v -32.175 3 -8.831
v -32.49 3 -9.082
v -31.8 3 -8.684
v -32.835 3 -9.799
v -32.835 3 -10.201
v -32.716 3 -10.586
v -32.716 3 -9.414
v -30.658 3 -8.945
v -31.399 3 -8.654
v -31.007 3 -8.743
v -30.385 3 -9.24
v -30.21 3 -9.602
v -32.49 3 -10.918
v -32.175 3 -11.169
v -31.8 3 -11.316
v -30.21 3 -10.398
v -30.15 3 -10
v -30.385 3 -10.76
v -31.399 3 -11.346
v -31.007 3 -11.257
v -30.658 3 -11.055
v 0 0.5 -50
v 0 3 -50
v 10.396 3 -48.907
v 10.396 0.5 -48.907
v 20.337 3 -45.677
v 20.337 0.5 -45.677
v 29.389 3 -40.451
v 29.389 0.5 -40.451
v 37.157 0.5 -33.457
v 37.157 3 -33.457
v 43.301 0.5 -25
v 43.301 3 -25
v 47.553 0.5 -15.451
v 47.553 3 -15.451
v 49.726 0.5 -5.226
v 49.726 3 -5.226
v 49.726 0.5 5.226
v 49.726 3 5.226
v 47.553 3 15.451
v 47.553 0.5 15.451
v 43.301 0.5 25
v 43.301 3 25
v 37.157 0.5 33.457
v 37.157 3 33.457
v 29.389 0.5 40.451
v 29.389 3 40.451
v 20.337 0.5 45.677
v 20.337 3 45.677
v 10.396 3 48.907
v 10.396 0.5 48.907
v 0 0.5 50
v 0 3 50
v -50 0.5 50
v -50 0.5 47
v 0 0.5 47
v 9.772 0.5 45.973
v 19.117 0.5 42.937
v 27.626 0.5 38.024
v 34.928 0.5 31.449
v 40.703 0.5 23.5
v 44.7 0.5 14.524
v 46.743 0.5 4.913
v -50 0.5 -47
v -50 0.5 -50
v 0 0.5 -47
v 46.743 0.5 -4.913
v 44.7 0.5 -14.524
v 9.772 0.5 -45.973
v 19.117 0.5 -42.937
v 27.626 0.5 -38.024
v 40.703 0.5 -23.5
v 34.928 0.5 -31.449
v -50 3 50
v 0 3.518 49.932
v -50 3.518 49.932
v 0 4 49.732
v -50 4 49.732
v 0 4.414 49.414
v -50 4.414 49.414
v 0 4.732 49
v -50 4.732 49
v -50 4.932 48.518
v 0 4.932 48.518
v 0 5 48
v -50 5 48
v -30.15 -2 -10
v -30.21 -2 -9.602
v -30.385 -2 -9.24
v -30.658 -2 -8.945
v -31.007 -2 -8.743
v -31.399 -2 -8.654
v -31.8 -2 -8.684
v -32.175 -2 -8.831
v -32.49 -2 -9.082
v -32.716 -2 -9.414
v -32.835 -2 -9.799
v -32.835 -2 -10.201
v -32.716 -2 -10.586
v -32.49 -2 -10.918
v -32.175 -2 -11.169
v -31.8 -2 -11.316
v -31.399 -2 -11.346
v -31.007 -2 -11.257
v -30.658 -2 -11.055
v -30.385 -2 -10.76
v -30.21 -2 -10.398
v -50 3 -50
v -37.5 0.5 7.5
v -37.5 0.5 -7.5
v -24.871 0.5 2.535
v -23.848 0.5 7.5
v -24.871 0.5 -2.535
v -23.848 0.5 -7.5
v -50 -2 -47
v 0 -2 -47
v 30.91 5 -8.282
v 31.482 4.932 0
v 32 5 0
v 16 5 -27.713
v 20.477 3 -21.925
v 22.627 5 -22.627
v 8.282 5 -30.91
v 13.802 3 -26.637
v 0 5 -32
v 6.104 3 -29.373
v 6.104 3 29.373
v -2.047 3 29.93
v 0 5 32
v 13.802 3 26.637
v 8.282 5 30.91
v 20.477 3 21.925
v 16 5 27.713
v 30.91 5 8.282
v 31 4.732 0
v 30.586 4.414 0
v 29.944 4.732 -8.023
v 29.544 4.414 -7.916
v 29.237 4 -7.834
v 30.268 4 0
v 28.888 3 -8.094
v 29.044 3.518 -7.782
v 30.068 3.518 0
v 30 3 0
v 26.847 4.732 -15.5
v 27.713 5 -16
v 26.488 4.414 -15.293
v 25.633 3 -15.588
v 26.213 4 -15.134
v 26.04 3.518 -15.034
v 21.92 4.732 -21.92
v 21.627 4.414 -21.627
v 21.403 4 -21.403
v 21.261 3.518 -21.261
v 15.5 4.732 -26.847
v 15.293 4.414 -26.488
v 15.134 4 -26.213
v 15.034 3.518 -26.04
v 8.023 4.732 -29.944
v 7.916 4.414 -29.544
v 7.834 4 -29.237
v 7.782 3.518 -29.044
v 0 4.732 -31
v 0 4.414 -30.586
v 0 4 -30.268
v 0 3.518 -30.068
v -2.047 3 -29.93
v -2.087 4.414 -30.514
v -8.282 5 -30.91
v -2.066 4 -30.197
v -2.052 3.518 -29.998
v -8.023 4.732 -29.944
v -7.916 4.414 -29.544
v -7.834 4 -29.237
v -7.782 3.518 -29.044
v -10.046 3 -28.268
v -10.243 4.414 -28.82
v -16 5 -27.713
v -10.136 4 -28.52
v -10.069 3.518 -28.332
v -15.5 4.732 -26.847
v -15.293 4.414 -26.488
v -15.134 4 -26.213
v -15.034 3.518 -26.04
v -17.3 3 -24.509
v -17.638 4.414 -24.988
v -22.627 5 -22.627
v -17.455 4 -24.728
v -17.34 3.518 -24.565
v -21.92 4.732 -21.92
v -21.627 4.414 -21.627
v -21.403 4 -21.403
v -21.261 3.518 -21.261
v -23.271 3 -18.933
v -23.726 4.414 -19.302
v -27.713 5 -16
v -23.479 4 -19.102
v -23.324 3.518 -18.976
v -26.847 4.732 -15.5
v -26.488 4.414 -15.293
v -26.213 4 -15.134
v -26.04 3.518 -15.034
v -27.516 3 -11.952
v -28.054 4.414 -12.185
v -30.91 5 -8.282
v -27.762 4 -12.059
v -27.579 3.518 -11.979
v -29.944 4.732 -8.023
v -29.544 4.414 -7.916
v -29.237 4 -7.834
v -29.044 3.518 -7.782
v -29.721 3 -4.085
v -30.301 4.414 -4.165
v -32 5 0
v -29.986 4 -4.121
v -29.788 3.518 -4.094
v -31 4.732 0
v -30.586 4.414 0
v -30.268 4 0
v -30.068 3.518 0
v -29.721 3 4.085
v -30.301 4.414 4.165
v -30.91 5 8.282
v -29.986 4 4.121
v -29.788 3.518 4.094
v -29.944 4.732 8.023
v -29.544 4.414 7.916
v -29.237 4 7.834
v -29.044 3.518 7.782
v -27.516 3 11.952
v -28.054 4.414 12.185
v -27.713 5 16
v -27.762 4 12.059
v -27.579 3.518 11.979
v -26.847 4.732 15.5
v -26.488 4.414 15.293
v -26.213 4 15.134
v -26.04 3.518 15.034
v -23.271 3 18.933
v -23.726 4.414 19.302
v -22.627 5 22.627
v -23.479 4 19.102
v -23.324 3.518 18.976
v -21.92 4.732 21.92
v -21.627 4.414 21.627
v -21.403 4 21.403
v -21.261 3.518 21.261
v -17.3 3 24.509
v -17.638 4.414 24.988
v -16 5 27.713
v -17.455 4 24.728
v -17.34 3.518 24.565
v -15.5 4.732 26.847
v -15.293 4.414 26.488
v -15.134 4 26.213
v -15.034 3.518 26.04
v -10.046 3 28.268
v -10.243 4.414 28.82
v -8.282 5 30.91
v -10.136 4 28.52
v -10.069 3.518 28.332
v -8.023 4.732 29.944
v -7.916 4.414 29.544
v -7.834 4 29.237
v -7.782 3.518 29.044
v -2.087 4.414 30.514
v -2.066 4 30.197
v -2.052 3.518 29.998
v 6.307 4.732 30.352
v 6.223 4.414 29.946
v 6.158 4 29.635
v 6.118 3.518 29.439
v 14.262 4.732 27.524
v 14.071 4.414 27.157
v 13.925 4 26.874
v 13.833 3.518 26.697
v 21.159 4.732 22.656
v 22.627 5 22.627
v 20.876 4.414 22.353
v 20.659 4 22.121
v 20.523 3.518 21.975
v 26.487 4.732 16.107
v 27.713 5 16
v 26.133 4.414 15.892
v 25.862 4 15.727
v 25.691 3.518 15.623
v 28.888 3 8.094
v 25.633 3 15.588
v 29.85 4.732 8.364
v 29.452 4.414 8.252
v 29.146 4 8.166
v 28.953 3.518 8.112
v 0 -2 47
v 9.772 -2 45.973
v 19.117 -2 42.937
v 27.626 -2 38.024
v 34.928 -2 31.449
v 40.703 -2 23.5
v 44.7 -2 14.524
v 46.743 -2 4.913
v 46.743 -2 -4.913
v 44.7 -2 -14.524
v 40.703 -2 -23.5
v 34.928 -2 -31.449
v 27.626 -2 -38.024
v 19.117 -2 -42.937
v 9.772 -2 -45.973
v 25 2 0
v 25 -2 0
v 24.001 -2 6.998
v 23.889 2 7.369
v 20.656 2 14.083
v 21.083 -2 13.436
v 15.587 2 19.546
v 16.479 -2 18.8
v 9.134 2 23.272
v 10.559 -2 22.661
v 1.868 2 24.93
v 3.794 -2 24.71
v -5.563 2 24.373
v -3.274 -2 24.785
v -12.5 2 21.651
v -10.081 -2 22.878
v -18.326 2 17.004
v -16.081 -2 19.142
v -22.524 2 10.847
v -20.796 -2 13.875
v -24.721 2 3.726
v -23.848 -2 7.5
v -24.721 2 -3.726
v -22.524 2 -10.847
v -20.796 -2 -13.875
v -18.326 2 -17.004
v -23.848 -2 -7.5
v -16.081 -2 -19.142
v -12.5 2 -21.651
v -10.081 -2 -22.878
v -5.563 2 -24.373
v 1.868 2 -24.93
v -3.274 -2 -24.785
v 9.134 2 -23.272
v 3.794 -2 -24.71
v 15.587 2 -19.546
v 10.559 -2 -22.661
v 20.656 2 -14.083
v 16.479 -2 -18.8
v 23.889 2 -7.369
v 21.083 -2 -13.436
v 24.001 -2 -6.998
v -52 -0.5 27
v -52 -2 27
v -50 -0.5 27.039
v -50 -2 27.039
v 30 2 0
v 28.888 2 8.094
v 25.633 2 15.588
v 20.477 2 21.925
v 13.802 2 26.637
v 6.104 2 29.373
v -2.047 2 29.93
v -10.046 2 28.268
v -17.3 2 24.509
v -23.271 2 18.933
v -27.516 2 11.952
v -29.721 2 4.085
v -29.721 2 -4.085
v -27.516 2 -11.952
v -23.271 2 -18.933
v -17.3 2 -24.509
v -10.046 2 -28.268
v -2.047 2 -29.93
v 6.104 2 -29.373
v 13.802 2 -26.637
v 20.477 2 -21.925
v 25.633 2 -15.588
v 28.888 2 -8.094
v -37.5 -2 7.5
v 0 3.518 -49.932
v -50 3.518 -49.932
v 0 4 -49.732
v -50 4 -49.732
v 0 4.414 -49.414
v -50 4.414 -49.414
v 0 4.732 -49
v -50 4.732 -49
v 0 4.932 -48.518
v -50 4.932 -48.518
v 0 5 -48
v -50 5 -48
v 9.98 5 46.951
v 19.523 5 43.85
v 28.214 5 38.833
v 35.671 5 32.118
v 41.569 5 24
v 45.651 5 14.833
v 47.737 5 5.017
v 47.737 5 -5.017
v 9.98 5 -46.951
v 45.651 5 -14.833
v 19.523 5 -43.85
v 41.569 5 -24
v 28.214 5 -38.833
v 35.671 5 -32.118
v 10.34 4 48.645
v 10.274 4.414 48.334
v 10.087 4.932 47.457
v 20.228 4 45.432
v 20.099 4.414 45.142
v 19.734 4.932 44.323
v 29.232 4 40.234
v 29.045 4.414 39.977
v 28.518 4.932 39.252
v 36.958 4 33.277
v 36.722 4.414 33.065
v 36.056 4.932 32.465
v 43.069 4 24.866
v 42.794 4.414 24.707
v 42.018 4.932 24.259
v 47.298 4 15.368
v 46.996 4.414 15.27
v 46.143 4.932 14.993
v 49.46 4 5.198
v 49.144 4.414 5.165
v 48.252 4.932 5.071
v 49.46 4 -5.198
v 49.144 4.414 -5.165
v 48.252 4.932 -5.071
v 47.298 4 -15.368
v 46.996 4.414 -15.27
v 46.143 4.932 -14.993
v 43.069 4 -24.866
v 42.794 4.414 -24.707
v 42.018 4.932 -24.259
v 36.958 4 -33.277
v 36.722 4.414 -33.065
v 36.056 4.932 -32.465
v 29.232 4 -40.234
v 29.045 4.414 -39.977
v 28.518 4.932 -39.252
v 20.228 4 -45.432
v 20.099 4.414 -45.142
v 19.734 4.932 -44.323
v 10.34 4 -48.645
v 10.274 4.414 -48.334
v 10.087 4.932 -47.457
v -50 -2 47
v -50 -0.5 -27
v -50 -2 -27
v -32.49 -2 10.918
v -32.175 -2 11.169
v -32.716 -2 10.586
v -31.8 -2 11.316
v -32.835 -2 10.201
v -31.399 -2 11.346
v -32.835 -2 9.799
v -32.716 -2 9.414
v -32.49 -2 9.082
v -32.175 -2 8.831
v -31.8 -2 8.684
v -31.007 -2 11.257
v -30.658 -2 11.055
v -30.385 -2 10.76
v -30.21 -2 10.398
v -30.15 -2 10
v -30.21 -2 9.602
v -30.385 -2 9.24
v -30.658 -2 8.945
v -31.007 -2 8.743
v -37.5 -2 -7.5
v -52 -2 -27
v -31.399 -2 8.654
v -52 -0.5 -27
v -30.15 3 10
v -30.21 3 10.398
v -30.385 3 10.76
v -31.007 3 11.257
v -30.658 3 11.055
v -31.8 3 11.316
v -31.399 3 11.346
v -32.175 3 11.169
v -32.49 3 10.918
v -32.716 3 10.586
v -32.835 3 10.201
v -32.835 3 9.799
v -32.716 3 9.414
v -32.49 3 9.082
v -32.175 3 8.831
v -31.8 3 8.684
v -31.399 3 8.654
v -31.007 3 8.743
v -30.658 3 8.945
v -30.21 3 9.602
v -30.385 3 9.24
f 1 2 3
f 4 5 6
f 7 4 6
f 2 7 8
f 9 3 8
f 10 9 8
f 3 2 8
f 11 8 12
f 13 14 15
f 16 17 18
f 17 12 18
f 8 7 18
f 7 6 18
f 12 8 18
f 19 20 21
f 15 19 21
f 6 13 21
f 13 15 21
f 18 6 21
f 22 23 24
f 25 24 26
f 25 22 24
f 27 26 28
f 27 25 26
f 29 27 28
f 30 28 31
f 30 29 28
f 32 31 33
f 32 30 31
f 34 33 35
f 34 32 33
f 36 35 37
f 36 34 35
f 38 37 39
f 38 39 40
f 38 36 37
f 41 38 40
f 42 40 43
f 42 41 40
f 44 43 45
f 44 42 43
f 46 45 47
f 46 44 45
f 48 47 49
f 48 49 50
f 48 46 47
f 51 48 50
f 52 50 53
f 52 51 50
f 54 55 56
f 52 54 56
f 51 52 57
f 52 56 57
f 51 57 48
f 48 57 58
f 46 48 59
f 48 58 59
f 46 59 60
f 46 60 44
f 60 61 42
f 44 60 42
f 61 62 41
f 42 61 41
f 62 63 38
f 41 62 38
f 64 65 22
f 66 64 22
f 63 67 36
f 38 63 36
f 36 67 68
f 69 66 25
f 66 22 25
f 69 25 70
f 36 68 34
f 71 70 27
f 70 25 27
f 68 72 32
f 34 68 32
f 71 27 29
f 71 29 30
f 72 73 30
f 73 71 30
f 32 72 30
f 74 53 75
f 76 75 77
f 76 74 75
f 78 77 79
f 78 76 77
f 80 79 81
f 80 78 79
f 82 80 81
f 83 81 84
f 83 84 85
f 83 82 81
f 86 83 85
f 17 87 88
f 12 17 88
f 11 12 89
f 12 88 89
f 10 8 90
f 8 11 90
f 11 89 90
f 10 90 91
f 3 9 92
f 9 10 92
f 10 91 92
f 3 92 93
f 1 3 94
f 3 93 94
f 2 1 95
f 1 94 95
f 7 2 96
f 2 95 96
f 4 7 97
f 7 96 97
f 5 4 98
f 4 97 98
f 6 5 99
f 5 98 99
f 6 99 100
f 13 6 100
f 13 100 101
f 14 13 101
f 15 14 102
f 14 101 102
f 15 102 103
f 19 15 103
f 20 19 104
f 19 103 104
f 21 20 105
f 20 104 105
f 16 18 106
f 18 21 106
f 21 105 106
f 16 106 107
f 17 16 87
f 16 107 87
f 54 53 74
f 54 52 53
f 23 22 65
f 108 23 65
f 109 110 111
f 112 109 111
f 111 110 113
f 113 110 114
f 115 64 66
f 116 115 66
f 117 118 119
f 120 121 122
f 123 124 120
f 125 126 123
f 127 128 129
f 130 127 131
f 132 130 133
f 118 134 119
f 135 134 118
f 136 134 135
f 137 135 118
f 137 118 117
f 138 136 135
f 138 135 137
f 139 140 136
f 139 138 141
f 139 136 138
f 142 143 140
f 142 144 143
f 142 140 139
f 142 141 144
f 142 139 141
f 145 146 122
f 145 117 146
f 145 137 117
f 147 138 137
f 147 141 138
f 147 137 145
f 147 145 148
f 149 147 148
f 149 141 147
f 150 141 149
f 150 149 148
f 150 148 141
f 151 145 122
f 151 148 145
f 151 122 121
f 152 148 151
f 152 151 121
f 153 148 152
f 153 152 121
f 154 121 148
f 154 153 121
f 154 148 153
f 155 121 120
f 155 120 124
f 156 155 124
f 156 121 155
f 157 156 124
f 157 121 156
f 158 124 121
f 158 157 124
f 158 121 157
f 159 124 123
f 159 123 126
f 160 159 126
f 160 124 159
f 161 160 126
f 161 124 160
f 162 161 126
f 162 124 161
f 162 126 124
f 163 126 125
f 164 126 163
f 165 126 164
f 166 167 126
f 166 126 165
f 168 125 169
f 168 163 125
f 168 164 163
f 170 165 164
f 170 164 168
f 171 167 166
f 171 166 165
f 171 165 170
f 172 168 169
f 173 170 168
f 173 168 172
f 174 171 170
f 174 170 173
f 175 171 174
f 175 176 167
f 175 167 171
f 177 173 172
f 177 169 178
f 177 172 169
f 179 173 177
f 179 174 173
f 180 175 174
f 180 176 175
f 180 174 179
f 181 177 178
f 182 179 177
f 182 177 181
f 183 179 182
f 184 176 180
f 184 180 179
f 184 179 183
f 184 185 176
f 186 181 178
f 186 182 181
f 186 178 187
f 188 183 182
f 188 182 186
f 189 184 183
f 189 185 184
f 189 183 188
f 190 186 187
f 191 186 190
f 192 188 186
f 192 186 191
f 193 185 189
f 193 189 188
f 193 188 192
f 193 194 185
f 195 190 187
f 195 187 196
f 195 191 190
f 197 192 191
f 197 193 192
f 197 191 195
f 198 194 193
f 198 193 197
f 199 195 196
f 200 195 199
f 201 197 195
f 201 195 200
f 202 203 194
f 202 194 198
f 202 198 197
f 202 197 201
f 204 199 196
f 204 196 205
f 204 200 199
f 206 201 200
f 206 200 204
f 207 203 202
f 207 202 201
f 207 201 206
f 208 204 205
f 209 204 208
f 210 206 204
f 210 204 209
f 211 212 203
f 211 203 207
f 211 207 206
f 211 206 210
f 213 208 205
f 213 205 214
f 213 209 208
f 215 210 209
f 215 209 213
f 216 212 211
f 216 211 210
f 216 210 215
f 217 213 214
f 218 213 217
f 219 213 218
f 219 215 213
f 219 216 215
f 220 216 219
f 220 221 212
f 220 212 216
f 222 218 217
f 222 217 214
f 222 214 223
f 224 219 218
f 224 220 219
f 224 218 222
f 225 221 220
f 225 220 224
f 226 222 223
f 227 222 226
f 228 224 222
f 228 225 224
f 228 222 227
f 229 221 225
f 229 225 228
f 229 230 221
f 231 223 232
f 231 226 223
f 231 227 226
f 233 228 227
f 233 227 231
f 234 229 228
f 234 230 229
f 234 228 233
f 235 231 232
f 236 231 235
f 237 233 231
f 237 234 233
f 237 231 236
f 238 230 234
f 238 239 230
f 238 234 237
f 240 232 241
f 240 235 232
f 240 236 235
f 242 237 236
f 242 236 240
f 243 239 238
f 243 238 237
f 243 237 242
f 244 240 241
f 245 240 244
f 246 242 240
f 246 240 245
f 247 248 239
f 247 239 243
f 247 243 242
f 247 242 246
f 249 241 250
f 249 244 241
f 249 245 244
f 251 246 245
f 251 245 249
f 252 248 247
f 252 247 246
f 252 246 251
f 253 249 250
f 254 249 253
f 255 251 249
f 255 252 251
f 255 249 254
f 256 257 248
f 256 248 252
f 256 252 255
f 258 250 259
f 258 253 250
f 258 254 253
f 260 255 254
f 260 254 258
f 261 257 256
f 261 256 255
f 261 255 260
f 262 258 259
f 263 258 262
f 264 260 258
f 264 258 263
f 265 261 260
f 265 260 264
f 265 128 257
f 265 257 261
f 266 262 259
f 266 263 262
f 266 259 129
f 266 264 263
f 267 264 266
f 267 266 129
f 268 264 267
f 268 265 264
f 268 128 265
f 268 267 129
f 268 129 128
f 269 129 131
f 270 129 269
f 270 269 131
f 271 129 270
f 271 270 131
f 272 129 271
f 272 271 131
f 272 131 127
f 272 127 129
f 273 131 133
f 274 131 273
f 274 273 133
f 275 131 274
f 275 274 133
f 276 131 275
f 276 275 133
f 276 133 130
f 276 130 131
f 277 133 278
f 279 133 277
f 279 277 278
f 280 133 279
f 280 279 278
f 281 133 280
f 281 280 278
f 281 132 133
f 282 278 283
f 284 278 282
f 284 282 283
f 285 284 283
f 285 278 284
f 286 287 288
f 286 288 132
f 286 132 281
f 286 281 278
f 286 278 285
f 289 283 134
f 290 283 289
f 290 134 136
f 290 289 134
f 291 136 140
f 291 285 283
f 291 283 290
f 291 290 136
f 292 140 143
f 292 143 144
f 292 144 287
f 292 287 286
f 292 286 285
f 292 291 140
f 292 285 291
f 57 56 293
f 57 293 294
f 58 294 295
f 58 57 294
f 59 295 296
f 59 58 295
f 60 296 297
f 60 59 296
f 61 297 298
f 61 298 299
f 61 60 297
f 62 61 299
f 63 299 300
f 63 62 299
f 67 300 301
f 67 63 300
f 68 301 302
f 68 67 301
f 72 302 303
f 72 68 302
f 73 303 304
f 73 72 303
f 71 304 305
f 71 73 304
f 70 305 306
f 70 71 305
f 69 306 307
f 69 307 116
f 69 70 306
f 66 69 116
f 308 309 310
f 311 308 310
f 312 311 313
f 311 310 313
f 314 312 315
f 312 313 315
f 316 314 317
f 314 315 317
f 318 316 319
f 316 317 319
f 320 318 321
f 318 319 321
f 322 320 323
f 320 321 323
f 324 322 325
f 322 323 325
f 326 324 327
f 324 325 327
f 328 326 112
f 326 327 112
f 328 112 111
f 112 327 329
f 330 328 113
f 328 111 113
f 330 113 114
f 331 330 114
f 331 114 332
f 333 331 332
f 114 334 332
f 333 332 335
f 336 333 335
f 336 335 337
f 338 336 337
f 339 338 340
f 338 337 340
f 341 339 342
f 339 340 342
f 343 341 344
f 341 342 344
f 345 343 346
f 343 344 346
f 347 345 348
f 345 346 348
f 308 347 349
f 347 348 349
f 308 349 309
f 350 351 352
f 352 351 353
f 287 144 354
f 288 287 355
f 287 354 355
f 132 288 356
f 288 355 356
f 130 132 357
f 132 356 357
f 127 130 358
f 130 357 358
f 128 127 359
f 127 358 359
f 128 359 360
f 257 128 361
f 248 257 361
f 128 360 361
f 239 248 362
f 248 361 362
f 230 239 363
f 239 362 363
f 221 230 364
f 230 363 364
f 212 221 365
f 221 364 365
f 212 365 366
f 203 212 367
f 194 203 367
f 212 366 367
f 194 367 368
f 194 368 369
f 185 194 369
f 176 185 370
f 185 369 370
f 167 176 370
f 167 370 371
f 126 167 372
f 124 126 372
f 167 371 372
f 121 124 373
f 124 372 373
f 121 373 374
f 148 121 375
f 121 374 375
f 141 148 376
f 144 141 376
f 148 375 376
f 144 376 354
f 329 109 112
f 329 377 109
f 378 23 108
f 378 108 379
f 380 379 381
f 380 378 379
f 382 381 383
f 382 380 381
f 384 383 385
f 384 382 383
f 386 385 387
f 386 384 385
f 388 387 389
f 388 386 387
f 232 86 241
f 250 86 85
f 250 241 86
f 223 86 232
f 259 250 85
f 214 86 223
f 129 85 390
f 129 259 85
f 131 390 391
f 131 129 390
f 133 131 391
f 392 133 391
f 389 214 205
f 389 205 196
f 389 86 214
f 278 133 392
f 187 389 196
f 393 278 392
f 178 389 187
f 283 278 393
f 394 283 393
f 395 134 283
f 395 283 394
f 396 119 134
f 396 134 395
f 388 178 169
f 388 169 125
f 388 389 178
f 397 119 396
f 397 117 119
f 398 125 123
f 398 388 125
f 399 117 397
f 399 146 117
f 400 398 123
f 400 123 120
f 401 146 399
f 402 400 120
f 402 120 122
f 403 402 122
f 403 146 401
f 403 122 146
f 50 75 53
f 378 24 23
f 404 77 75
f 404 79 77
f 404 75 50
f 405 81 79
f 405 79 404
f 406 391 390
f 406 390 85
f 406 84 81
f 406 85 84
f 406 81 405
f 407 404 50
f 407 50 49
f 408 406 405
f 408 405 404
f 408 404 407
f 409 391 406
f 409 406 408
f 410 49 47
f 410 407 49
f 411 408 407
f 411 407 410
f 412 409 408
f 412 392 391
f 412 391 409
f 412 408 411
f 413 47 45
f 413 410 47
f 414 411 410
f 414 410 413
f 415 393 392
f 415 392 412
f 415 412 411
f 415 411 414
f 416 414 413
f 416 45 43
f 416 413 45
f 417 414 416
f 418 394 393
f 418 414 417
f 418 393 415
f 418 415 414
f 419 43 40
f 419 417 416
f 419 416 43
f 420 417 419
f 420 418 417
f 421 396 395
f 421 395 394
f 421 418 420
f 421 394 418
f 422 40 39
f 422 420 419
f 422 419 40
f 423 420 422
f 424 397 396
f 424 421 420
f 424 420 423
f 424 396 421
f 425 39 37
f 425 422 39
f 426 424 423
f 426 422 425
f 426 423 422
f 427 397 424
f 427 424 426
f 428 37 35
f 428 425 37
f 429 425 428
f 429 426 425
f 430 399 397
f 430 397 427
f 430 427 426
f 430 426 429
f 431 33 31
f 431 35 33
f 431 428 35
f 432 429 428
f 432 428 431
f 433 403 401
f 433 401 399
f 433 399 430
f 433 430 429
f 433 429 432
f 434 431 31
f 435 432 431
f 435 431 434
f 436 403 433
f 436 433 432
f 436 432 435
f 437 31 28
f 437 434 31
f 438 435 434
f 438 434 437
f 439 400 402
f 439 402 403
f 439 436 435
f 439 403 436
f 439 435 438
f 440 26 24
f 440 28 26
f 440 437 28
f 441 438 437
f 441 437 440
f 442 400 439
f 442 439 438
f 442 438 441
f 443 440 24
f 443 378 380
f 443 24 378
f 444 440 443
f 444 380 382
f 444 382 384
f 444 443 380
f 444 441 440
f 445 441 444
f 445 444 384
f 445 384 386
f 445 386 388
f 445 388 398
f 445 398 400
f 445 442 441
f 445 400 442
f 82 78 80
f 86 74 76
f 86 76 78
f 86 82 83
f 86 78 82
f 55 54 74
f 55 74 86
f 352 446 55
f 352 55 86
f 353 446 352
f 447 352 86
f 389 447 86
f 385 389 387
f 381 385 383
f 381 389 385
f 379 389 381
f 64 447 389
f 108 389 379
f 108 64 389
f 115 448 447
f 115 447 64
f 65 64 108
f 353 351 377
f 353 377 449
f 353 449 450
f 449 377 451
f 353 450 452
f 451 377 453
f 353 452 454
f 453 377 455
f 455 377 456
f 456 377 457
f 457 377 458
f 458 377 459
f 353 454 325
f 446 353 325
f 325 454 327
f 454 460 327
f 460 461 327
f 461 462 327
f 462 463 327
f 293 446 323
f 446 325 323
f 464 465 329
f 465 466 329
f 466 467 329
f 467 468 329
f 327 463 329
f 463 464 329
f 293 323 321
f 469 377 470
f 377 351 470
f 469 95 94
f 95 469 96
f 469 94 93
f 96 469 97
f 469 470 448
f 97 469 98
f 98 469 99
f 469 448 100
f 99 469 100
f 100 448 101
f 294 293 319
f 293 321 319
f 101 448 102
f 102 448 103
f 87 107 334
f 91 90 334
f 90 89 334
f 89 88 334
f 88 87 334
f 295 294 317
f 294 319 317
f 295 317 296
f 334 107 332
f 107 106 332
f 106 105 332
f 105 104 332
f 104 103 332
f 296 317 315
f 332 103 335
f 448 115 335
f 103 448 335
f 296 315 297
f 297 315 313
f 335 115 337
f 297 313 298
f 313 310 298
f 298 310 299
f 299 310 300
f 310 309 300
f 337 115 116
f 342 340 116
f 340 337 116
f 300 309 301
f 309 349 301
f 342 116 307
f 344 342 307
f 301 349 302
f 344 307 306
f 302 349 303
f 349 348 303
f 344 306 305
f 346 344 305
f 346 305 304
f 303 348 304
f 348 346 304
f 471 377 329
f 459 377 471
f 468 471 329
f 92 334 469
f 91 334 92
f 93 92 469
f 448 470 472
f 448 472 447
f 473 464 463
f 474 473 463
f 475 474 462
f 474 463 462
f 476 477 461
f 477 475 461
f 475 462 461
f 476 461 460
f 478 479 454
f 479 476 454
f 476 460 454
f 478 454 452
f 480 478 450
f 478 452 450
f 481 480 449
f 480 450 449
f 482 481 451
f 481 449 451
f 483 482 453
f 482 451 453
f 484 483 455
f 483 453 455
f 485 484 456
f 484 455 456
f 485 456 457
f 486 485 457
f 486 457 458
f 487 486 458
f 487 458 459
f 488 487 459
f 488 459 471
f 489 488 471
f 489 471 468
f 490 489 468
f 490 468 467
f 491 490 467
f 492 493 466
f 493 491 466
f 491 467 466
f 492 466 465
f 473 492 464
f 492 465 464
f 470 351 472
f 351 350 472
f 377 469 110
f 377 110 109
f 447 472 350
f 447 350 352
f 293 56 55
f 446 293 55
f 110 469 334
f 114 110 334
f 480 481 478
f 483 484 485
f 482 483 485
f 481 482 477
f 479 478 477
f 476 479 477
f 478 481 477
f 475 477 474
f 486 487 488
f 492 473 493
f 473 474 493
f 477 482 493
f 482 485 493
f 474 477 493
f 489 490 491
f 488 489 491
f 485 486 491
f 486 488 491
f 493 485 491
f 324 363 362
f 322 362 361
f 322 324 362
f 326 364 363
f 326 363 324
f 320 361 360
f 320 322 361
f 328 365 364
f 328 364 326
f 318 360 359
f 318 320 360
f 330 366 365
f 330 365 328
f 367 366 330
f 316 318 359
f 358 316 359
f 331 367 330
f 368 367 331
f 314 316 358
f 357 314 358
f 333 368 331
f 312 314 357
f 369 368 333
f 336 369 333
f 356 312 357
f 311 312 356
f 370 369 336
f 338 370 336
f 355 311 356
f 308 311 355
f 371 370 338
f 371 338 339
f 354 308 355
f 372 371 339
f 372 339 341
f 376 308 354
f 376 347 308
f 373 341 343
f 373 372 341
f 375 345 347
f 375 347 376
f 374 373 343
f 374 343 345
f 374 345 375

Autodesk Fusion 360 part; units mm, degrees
sketch "スケッチ1" plane through (0, 0, 0) normal (0, 1, 0) x (1, 0, 0)
  line L0 (84.9076, 0) -> (-96.0768, 0) construction
  line L1 (0, -64.1732) -> (0, 68.3912) construction
  line L2 (0, -50) -> (-50, -50)
  line L3 (-50, -50) -> (-50, 50)
  line L4 (0, 50) -> (-50, 50)
  circle A0 centre (0, 0) radius 25
  arc A1 (0, -50) -> (0, 50) centre (0, 0) ccw
  line L5 (0, -47) -> (-50, -47)
  line L6 (0, 47) -> (-50, 47)
  arc A2 (0, -47) -> (0, 47) centre (0, 0) ccw
  circle A3 centre (0, 0) radius 30
  line L7 (-50, -47) -> (-52, -47)
  line L8 (-52, -47) -> (-52, 47)
  line L9 (-52, 47) -> (-50, 47)
  line L10 (-50, 47) -> (-50, -47)
  line L11 (-31.5, 57.8245) -> (-31.5, -58.1462) construction
  line L12 (-37.5, -7.5) -> (-25, -7.5)
  line L13 (-25, 7.5) -> (-37.5, 7.5)
  line L14 (-37.5, 7.5) -> (-37.5, -7.5)
  line L15 (-25, -7.5) -> (-23.8485, -7.5)
  line L16 (-25, 7.5) -> (-23.8485, 7.5)
  line L17 (-32.1391, -10) -> (-28.2843, -10) construction
  line L18 (-32.1391, 10) -> (-28.2843, 10) construction
  circle A4 centre (-31.5, -10) radius 1.35
  circle A5 centre (-31.5, 10) radius 1.35
  line L19 (-52, -27) -> (-50, -27.0394)
  line L20 (-52, 27) -> (-50, 27)
  dimension "d1" = 100
  dimension "d2" = 50
  dimension "d3" = 50
  dimension "d4" = 94
  dimension "d5" = 60
  dimension "d17" = 2
  dimension "d18" = 31.5
  dimension "d20" = 15
  dimension "d21" = 7.5
  dimension "d22" = 6
  dimension "d23" = 20
  dimension "d24" = 10
  dimension "d25" = 2.7
  dimension "d26" = 2.7
  dimension "d36" = 20
  dimension "d37" = 20
extrude "押し出し1" add sketch "スケッチ1" along normal blind 5 contours L2 L3 L4 A1 L5 L6 A2 | L3 L5 L6 A2 L10 | A3 L12 L13 L14 | A4 | A5
fillet "フィレット1" radius 2 3 edges at (-25, 5, 50) (50, 5, 0) (-25, 5, -50)
fillet "フィレット2" radius 2 1 edges at (-27.9698, 5, -10.8485)
extrude "押し出し3" add sketch "スケッチ1" against normal blind 2 contours L3 L7 L8 L10 L19 | L3 L5 L6 A2 L10 | L3 L8 L10 L19 L20 | L3 L8 L9 L10 L20 | A0 A3 L12 L13 L15 L16 | A0 A3 L12 L13 L15 L16 | A3 L12 L13 L14 | A4 | A5
extrude "押し出し7" add sketch "スケッチ1" along normal blind 2 contours A0 A3 L12 L13 L15 L16 | A0 A3 L12 L13 L15 L16
extrude "押し出し8" cut 1 faces at (-33.3333, 0, -49) along direction (0, 1, 0) blind 0.5
extrude "押し出し9" cut 1 faces at (-50.6667, 0, 15.6667) along direction (0, -1, 0) blind 0.5
extrude "押し出し4" cut sketch "スケッチ1" along normal blind 2.5 from surface at -2 contours A0 A3 L12 L13 L15 L16 | A3 L12 L13 L14 picked at (-28.2382, -1.7675)
extrude "押し出し5" add sketch "スケッチ1" along normal blind 3 from surface at -2 contours A4 | A5
extrude "押し出し6" cut sketch "スケッチ1" along normal blind 5 from surface at -2 contours L3 L7 L8 L10 L19 | L3 L8 L9 L10 L20 | A4 | A5
equation "d21 = d20 / 2"
equation "d24 = d23 / 2"
